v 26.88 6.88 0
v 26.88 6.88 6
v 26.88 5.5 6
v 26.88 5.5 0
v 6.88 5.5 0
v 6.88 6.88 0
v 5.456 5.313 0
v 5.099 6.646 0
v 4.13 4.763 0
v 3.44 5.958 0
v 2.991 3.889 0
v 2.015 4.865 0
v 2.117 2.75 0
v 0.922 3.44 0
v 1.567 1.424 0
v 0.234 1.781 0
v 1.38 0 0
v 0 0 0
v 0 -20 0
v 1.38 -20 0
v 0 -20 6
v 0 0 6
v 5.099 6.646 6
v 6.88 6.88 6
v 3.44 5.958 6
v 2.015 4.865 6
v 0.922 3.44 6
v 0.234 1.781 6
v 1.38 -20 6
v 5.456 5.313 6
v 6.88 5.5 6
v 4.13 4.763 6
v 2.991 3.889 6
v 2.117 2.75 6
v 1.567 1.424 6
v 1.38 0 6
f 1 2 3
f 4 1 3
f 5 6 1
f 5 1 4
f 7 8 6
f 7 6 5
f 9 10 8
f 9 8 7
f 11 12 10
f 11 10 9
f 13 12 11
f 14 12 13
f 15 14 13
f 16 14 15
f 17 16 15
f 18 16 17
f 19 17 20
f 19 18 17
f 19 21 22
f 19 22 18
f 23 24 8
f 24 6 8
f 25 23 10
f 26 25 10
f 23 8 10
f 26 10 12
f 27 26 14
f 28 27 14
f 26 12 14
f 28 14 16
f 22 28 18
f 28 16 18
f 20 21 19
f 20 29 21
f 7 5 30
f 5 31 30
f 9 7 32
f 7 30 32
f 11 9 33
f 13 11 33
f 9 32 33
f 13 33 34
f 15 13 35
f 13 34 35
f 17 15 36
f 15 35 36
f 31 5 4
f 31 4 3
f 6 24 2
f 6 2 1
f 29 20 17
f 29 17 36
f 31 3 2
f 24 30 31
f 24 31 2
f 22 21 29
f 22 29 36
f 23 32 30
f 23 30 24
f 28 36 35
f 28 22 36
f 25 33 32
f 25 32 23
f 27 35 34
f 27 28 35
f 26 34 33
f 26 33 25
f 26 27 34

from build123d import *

# Parameters (mm, degrees)
SKETCH016_W = 1.38
SKETCH016_H = 6


with BuildPart() as part:
    # AdditivePipe005: sweep along a path in Sketch015
    with BuildLine(Plane.XY) as additivepipe005_path:
        Line((26.88, 5.5), (6.88, 5.5))
        ThreePointArc((6.88, 5.5), (2.990913, 3.889087), (1.38, 0))
        Line((1.38, 0), (1.38, -20))
    # Sketch016 → AdditivePipe005 (sweep)
    with BuildSketch(Plane.XZ):
        with Locations((0.69, 3)):
            Rectangle(SKETCH016_W, SKETCH016_H)
    sweep(path=additivepipe005_path.line)


solid = part.part
